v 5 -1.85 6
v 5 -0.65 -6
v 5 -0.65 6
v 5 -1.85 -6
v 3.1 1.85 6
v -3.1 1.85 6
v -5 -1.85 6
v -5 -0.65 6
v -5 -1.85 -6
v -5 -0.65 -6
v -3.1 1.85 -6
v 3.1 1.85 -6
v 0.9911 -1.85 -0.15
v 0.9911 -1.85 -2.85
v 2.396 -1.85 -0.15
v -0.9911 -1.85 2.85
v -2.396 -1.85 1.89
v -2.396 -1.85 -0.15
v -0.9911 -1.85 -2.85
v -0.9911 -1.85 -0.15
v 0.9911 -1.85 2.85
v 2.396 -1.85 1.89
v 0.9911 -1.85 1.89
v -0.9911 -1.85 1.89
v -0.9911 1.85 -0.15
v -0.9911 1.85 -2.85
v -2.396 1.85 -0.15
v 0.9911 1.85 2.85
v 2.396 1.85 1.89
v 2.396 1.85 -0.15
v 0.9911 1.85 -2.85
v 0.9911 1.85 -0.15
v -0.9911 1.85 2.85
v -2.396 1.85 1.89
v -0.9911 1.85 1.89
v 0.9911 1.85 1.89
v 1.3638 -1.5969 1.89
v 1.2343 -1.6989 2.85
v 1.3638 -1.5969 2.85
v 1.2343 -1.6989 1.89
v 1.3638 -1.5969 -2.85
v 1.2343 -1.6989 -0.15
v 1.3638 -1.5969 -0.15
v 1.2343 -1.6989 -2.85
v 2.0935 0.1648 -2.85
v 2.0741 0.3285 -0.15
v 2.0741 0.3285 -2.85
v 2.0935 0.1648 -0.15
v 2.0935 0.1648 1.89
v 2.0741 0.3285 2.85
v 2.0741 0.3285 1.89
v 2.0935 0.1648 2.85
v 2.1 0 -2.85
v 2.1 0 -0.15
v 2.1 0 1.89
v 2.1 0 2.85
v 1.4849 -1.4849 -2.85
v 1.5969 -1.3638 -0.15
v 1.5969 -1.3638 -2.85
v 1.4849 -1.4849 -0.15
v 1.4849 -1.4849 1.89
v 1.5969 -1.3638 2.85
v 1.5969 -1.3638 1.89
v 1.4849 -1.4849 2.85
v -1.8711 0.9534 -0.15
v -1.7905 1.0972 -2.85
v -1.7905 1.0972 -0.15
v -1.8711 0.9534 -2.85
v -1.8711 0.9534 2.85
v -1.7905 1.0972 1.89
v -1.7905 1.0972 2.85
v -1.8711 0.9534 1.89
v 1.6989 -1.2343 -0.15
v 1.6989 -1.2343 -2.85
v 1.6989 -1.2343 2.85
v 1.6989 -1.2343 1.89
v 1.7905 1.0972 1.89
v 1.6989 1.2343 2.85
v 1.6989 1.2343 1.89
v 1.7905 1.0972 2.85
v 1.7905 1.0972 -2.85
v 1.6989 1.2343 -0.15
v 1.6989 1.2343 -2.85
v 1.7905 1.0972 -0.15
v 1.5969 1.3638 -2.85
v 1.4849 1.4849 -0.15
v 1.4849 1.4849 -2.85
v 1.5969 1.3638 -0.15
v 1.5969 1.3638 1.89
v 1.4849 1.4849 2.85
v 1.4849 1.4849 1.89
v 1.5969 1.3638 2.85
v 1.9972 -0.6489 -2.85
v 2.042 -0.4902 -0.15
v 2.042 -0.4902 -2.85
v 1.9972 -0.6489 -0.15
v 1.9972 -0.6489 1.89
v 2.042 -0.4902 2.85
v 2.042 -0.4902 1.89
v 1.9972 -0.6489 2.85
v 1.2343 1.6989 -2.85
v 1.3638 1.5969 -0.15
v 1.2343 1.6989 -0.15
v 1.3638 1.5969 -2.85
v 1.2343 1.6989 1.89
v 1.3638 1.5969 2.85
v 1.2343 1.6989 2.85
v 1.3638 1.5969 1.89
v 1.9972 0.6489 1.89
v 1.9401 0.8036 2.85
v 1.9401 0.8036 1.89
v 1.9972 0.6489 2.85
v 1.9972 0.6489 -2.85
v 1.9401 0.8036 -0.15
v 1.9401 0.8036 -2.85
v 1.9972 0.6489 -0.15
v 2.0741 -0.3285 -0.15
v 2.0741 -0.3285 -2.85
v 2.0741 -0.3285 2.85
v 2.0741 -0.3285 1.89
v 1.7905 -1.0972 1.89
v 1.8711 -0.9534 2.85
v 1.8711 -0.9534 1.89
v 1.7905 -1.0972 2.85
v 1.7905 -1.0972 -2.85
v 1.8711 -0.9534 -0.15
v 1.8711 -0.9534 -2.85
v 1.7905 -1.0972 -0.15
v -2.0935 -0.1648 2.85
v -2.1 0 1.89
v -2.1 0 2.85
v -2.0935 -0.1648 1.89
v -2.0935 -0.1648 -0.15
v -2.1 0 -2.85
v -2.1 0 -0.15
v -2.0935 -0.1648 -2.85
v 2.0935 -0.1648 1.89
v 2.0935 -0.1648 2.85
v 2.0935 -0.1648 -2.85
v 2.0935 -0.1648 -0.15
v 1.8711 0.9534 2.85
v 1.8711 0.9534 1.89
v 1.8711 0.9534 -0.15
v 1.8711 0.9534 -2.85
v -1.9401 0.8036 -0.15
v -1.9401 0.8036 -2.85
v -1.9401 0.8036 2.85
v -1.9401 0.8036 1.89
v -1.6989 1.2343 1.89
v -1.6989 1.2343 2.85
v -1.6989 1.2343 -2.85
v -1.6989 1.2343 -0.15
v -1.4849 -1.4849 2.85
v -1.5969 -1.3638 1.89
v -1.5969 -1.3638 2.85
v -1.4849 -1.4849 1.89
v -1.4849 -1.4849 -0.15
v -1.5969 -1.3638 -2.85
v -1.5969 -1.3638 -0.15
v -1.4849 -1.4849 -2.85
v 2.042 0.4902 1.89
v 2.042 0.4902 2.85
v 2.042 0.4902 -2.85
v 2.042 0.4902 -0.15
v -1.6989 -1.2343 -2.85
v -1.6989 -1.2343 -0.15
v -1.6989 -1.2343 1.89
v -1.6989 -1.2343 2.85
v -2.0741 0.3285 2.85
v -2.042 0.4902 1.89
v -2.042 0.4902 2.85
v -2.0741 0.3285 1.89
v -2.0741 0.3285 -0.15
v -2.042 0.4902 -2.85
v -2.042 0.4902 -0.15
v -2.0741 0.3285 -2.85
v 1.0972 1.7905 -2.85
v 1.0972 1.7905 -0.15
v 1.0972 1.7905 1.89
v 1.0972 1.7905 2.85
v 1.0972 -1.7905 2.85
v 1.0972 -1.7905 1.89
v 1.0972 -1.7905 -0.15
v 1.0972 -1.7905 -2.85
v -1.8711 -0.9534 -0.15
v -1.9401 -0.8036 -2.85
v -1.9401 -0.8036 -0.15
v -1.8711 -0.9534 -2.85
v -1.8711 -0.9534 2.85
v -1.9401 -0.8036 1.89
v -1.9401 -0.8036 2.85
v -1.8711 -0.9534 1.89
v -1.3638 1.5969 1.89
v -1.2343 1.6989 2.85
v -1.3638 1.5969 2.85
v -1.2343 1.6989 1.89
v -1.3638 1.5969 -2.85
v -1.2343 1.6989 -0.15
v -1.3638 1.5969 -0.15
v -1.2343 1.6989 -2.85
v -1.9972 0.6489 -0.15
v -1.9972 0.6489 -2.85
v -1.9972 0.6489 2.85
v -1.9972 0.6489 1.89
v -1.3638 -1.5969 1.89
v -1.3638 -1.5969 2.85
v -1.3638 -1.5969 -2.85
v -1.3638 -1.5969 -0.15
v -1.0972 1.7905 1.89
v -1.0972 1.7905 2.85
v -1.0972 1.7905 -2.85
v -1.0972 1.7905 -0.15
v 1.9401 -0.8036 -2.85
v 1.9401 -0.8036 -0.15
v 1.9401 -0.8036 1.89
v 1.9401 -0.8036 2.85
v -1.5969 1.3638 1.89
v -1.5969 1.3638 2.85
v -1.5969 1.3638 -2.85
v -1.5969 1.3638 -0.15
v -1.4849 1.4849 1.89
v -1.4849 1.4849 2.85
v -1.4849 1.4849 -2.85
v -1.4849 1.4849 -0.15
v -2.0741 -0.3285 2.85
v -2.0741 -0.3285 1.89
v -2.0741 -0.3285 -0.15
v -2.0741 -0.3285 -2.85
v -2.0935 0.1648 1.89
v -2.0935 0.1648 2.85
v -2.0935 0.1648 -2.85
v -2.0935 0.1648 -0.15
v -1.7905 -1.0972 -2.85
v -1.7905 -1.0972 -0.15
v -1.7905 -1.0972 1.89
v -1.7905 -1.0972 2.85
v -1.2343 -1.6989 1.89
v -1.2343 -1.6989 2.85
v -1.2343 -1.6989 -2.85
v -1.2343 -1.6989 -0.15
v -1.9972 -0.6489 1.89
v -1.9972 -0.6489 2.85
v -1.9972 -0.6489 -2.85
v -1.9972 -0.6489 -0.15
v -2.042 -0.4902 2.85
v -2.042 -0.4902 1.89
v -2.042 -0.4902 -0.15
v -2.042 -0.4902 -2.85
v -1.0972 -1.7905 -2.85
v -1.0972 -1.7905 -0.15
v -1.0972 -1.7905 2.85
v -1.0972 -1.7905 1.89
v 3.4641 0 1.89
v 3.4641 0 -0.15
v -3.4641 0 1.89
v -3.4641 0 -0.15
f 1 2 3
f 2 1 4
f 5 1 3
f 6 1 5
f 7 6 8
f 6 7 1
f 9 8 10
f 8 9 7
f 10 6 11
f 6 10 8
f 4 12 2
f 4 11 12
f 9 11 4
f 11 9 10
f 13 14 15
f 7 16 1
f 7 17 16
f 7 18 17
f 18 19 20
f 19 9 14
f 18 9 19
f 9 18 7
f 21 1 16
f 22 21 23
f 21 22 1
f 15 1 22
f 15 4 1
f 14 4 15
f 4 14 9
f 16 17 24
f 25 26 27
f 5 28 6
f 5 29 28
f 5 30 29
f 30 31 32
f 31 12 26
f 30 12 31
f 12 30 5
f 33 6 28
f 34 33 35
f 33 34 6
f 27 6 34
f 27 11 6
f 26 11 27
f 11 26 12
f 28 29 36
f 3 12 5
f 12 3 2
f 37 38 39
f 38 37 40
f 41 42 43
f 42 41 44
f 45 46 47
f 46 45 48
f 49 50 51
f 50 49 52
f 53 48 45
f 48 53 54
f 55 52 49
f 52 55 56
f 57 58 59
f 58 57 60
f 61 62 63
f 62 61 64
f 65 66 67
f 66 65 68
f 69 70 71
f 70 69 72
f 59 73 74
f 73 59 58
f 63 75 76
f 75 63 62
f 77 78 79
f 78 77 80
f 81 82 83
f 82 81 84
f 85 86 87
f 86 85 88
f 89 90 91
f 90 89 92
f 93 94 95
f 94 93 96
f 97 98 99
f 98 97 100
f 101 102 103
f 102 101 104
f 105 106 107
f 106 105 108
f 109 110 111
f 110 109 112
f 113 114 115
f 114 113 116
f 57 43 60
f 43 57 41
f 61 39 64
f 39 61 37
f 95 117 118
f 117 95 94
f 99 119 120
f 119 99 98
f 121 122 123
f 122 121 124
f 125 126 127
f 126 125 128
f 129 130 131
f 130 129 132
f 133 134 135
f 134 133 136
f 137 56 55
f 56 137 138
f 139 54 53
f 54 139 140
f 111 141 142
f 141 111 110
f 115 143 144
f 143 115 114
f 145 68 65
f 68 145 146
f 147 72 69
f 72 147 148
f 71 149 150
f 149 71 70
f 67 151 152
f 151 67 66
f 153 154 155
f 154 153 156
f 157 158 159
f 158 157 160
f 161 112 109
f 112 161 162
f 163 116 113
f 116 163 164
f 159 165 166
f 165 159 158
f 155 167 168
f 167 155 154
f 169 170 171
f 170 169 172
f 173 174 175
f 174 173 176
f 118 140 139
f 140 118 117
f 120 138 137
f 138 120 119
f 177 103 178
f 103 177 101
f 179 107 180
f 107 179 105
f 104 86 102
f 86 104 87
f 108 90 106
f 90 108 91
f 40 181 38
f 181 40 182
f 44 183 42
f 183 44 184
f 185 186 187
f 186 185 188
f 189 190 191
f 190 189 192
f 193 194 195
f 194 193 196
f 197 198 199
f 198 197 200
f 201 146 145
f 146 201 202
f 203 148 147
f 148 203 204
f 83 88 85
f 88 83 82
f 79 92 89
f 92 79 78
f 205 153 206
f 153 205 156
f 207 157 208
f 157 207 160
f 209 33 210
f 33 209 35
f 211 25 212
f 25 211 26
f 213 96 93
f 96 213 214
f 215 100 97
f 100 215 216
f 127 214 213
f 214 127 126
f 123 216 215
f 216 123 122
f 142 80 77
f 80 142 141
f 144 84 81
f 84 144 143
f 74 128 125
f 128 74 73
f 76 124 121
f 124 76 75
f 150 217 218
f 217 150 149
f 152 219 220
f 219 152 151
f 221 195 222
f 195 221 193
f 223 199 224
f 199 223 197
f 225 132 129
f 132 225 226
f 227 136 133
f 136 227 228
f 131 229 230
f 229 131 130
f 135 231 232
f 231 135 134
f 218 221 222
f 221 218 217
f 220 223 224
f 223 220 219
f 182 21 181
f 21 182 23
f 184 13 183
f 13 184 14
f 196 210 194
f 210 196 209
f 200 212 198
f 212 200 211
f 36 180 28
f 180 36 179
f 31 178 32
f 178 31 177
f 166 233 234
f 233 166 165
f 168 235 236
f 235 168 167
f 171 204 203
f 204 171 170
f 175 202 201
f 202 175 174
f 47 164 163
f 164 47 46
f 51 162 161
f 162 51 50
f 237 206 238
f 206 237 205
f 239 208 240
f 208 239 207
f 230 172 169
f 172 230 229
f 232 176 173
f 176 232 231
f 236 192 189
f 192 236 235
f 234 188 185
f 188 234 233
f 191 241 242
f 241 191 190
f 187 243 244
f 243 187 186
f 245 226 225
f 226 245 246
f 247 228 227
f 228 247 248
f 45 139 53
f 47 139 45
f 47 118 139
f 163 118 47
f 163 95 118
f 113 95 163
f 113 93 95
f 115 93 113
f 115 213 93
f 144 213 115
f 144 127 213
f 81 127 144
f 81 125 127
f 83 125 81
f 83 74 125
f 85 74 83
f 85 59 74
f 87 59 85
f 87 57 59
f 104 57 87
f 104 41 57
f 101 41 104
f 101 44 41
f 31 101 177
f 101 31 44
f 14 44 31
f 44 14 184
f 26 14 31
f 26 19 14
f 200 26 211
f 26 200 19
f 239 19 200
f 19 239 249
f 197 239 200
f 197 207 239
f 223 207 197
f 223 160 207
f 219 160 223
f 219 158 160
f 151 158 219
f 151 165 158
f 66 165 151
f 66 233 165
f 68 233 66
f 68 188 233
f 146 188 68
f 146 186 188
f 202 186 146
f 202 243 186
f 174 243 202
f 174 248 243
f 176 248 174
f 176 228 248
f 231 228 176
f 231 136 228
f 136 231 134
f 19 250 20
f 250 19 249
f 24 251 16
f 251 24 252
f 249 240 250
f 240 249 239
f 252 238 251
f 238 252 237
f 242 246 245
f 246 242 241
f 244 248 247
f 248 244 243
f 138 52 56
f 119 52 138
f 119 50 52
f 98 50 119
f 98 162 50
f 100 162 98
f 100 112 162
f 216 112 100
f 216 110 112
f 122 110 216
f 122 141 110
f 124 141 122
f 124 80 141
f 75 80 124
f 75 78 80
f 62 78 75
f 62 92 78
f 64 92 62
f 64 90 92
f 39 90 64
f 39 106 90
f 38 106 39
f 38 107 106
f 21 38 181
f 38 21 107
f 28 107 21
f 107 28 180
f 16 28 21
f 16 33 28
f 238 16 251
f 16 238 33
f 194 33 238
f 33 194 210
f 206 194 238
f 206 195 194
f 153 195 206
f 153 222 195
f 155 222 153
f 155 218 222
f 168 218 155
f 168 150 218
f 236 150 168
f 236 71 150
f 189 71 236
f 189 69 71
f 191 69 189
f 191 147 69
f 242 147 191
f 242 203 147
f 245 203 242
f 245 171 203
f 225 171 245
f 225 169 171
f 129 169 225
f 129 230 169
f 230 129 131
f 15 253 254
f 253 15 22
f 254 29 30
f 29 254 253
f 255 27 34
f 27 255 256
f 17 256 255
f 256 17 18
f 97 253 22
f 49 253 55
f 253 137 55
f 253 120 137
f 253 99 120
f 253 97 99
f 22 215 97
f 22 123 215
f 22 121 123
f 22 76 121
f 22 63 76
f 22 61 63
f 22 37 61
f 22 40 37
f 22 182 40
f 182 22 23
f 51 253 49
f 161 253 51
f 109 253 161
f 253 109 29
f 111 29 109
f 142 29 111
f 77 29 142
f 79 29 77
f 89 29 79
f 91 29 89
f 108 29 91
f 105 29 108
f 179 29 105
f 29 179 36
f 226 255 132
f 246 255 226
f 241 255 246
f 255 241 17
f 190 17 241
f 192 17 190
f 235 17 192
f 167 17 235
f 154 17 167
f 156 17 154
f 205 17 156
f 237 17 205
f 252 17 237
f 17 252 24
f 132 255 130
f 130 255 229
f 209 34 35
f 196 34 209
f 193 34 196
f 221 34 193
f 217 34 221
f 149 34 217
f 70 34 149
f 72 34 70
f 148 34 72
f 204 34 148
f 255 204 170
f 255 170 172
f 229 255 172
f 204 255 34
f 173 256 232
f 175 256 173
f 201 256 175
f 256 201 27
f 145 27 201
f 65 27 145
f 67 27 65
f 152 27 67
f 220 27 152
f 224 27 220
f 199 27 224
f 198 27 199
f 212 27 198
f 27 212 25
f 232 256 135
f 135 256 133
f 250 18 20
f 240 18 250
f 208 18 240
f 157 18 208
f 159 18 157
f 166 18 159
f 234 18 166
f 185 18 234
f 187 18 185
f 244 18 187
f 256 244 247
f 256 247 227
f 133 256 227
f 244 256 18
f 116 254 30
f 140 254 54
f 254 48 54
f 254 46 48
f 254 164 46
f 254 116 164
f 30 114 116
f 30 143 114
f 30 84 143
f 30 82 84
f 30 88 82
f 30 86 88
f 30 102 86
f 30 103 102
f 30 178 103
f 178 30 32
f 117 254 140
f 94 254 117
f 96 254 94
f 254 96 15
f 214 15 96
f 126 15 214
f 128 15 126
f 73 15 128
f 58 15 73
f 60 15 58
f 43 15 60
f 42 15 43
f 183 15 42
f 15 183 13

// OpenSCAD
// T-slot nut (simple printable profile) for:
// - 4.0mm screw (clearance hole default 4.2mm)
// - 6.0mm across flats hex pocket
// - 3.7mm thick overall
//
// Structural fixes:
// - Replace any cross/plus cutout with a centered circular through-hole (M4 clearance)
// - Keep a recognizable T-slot nut silhouette (neck + lips/undercut), extruded along length
// - Ensure all features are connected (single solid via one difference())
// - All translate() values are derived from dimensions (no arbitrary offsets)
// - Small overlaps (eps/overcut) ensure clean boolean results

$fn = 80;

// Requested key dimensions
thickness    = 3.7;     // overall Z thickness
hex_af       = 6.0;     // hex pocket across flats
hole_d       = 4.2;     // clearance for M4 (use 4.0 tight, 4.3 loose)

// Reasonable/typical T-slot nut proportions (simplified)
body_len     = 12.0;    // along slot (X)
slot_neck_w  = 6.2;     // neck width (top, Y)
shoulder_w   = 10.0;    // lip width (bottom, Y)
shoulder_h   = 1.2;     // lip height (bottom portion of thickness)

// Simple edge chamfer (optional)
edge_chamfer = 0.6;

// Hole lead-in (top)
lead_in_d    = 6.0;
lead_in_h    = 0.8;

// Derived
neck_h = thickness - shoulder_h;
hex_r  = hex_af / sqrt(3);   // circumradius for across-flats hex
eps    = 0.02;               // small overlap for booleans
overcut = 2;                 // extra cutter length to guarantee through-cuts

// 2D profile of a T-slot nut cross-section in Y-Z plane, extruded along X (body_len)
module tnut_profile_2d() {
    // Centered at Y=0, Z=0
    polygon(points=[
        [-slot_neck_w/2,  thickness/2],
        [ slot_neck_w/2,  thickness/2],
        [ shoulder_w/2,    thickness/2 - neck_h],
        [ shoulder_w/2,   -thickness/2],
        [-shoulder_w/2,   -thickness/2],
        [-shoulder_w/2,    thickness/2 - neck_h]
    ]);
}

module tnut_body() {
    linear_extrude(height=body_len, center=true, convexity=10)
        tnut_profile_2d();
}

// Chamfer cutters along the long edges (X direction)
module edge_chamfer_cuts() {
    // Place cutters at the outer Y edges and outer Z edges.
    // Use derived extents so cutters always intersect the body.
    for (sy = [-1, 1], sz = [-1, 1]) {
        translate([0,
                   sy*(shoulder_w/2),
                   sz*(thickness/2)])
            rotate([45*sz, 0, 0])
                cube([body_len + overcut, edge_chamfer*2, edge_chamfer*2], center=true);
    }
}

// Hex pocket on top face (shallow)
module hex_pocket() {
    // Keep some material under pocket
    pocket_h = min(2.0, thickness - 0.8);
    translate([0, 0, thickness/2 - pocket_h/2 + eps])
        cylinder(h=pocket_h + 2*eps, r=hex_r, center=true, $fn=6);
}

// Lead-in chamfer for the screw hole on top
module hole_lead_in() {
    translate([0, 0, thickness/2 - lead_in_h/2 + eps])
        cylinder(h=lead_in_h + 2*eps, r1=lead_in_d/2, r2=hole_d/2, center=true);
}

// Final model: one connected solid (single boolean difference from one body)
difference() {
    // Main body (with optional edge chamfers removed)
    difference() {
        tnut_body();
        if (edge_chamfer > 0)
            edge_chamfer_cuts();
    }

    // Centered round through-hole for M4 screw (replaces any cross/plus cutout)
    cylinder(h=thickness + overcut, r=hole_d/2, center=true);

    // Lead-in on top
    hole_lead_in();

    // Hex pocket on top (6.0mm across flats)
    hex_pocket();
}
